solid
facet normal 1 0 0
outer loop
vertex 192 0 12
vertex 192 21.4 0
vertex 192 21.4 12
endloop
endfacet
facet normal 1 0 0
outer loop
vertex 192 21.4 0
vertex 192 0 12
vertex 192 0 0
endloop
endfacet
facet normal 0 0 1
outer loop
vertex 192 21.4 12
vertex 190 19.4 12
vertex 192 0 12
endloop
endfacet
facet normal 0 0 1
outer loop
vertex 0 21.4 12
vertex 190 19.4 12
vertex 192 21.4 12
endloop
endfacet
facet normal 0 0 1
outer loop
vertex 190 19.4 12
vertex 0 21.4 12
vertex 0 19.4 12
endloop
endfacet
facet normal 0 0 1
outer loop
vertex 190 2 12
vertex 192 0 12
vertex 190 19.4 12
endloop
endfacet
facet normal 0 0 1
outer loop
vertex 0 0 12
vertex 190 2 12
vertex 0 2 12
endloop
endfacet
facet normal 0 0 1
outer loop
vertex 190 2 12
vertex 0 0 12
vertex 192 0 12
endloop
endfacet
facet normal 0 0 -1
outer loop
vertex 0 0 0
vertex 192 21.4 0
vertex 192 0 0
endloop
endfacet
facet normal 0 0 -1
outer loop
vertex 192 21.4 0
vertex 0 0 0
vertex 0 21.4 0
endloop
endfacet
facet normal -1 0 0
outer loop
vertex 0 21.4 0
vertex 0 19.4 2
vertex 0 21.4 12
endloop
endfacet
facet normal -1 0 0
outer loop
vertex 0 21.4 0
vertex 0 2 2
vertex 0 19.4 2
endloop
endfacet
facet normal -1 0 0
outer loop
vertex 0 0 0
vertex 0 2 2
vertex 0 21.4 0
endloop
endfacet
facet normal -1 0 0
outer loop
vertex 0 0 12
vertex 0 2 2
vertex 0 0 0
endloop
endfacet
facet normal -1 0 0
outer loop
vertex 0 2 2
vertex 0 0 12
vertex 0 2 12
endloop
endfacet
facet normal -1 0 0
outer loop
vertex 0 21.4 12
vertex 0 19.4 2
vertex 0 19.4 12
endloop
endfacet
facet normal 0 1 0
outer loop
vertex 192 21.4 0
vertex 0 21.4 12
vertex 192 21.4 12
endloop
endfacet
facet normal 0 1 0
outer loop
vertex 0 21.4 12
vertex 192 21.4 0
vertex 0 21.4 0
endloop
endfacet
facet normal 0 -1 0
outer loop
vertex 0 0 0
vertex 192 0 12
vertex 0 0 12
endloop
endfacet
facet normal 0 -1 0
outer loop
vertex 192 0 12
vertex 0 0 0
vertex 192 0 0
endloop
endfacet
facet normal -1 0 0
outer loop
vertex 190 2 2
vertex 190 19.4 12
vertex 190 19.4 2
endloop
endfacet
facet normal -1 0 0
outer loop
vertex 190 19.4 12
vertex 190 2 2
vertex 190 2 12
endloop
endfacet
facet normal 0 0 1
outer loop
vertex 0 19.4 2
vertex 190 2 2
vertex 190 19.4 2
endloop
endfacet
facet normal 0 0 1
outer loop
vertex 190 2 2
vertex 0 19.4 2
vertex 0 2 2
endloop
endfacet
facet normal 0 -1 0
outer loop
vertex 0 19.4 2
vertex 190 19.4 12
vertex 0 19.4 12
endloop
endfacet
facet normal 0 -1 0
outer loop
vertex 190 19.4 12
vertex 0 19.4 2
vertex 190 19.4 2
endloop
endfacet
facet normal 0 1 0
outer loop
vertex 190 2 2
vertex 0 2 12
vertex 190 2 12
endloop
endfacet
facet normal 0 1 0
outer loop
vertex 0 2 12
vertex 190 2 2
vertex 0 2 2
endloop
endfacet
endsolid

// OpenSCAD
//SchreibtischLeisteUnten

d=17.4;
l=190;

hbr=2000;
hbl=12;

t=2.0;

module brett()
{
    translate([0,t,t])
    cube([l, d, hbr]);
}

module blende()
{
    translate([0,0,0])
    cube([l+t, d+t+t, hbl]);
}

difference()
{
    blende();
    brett();
}
